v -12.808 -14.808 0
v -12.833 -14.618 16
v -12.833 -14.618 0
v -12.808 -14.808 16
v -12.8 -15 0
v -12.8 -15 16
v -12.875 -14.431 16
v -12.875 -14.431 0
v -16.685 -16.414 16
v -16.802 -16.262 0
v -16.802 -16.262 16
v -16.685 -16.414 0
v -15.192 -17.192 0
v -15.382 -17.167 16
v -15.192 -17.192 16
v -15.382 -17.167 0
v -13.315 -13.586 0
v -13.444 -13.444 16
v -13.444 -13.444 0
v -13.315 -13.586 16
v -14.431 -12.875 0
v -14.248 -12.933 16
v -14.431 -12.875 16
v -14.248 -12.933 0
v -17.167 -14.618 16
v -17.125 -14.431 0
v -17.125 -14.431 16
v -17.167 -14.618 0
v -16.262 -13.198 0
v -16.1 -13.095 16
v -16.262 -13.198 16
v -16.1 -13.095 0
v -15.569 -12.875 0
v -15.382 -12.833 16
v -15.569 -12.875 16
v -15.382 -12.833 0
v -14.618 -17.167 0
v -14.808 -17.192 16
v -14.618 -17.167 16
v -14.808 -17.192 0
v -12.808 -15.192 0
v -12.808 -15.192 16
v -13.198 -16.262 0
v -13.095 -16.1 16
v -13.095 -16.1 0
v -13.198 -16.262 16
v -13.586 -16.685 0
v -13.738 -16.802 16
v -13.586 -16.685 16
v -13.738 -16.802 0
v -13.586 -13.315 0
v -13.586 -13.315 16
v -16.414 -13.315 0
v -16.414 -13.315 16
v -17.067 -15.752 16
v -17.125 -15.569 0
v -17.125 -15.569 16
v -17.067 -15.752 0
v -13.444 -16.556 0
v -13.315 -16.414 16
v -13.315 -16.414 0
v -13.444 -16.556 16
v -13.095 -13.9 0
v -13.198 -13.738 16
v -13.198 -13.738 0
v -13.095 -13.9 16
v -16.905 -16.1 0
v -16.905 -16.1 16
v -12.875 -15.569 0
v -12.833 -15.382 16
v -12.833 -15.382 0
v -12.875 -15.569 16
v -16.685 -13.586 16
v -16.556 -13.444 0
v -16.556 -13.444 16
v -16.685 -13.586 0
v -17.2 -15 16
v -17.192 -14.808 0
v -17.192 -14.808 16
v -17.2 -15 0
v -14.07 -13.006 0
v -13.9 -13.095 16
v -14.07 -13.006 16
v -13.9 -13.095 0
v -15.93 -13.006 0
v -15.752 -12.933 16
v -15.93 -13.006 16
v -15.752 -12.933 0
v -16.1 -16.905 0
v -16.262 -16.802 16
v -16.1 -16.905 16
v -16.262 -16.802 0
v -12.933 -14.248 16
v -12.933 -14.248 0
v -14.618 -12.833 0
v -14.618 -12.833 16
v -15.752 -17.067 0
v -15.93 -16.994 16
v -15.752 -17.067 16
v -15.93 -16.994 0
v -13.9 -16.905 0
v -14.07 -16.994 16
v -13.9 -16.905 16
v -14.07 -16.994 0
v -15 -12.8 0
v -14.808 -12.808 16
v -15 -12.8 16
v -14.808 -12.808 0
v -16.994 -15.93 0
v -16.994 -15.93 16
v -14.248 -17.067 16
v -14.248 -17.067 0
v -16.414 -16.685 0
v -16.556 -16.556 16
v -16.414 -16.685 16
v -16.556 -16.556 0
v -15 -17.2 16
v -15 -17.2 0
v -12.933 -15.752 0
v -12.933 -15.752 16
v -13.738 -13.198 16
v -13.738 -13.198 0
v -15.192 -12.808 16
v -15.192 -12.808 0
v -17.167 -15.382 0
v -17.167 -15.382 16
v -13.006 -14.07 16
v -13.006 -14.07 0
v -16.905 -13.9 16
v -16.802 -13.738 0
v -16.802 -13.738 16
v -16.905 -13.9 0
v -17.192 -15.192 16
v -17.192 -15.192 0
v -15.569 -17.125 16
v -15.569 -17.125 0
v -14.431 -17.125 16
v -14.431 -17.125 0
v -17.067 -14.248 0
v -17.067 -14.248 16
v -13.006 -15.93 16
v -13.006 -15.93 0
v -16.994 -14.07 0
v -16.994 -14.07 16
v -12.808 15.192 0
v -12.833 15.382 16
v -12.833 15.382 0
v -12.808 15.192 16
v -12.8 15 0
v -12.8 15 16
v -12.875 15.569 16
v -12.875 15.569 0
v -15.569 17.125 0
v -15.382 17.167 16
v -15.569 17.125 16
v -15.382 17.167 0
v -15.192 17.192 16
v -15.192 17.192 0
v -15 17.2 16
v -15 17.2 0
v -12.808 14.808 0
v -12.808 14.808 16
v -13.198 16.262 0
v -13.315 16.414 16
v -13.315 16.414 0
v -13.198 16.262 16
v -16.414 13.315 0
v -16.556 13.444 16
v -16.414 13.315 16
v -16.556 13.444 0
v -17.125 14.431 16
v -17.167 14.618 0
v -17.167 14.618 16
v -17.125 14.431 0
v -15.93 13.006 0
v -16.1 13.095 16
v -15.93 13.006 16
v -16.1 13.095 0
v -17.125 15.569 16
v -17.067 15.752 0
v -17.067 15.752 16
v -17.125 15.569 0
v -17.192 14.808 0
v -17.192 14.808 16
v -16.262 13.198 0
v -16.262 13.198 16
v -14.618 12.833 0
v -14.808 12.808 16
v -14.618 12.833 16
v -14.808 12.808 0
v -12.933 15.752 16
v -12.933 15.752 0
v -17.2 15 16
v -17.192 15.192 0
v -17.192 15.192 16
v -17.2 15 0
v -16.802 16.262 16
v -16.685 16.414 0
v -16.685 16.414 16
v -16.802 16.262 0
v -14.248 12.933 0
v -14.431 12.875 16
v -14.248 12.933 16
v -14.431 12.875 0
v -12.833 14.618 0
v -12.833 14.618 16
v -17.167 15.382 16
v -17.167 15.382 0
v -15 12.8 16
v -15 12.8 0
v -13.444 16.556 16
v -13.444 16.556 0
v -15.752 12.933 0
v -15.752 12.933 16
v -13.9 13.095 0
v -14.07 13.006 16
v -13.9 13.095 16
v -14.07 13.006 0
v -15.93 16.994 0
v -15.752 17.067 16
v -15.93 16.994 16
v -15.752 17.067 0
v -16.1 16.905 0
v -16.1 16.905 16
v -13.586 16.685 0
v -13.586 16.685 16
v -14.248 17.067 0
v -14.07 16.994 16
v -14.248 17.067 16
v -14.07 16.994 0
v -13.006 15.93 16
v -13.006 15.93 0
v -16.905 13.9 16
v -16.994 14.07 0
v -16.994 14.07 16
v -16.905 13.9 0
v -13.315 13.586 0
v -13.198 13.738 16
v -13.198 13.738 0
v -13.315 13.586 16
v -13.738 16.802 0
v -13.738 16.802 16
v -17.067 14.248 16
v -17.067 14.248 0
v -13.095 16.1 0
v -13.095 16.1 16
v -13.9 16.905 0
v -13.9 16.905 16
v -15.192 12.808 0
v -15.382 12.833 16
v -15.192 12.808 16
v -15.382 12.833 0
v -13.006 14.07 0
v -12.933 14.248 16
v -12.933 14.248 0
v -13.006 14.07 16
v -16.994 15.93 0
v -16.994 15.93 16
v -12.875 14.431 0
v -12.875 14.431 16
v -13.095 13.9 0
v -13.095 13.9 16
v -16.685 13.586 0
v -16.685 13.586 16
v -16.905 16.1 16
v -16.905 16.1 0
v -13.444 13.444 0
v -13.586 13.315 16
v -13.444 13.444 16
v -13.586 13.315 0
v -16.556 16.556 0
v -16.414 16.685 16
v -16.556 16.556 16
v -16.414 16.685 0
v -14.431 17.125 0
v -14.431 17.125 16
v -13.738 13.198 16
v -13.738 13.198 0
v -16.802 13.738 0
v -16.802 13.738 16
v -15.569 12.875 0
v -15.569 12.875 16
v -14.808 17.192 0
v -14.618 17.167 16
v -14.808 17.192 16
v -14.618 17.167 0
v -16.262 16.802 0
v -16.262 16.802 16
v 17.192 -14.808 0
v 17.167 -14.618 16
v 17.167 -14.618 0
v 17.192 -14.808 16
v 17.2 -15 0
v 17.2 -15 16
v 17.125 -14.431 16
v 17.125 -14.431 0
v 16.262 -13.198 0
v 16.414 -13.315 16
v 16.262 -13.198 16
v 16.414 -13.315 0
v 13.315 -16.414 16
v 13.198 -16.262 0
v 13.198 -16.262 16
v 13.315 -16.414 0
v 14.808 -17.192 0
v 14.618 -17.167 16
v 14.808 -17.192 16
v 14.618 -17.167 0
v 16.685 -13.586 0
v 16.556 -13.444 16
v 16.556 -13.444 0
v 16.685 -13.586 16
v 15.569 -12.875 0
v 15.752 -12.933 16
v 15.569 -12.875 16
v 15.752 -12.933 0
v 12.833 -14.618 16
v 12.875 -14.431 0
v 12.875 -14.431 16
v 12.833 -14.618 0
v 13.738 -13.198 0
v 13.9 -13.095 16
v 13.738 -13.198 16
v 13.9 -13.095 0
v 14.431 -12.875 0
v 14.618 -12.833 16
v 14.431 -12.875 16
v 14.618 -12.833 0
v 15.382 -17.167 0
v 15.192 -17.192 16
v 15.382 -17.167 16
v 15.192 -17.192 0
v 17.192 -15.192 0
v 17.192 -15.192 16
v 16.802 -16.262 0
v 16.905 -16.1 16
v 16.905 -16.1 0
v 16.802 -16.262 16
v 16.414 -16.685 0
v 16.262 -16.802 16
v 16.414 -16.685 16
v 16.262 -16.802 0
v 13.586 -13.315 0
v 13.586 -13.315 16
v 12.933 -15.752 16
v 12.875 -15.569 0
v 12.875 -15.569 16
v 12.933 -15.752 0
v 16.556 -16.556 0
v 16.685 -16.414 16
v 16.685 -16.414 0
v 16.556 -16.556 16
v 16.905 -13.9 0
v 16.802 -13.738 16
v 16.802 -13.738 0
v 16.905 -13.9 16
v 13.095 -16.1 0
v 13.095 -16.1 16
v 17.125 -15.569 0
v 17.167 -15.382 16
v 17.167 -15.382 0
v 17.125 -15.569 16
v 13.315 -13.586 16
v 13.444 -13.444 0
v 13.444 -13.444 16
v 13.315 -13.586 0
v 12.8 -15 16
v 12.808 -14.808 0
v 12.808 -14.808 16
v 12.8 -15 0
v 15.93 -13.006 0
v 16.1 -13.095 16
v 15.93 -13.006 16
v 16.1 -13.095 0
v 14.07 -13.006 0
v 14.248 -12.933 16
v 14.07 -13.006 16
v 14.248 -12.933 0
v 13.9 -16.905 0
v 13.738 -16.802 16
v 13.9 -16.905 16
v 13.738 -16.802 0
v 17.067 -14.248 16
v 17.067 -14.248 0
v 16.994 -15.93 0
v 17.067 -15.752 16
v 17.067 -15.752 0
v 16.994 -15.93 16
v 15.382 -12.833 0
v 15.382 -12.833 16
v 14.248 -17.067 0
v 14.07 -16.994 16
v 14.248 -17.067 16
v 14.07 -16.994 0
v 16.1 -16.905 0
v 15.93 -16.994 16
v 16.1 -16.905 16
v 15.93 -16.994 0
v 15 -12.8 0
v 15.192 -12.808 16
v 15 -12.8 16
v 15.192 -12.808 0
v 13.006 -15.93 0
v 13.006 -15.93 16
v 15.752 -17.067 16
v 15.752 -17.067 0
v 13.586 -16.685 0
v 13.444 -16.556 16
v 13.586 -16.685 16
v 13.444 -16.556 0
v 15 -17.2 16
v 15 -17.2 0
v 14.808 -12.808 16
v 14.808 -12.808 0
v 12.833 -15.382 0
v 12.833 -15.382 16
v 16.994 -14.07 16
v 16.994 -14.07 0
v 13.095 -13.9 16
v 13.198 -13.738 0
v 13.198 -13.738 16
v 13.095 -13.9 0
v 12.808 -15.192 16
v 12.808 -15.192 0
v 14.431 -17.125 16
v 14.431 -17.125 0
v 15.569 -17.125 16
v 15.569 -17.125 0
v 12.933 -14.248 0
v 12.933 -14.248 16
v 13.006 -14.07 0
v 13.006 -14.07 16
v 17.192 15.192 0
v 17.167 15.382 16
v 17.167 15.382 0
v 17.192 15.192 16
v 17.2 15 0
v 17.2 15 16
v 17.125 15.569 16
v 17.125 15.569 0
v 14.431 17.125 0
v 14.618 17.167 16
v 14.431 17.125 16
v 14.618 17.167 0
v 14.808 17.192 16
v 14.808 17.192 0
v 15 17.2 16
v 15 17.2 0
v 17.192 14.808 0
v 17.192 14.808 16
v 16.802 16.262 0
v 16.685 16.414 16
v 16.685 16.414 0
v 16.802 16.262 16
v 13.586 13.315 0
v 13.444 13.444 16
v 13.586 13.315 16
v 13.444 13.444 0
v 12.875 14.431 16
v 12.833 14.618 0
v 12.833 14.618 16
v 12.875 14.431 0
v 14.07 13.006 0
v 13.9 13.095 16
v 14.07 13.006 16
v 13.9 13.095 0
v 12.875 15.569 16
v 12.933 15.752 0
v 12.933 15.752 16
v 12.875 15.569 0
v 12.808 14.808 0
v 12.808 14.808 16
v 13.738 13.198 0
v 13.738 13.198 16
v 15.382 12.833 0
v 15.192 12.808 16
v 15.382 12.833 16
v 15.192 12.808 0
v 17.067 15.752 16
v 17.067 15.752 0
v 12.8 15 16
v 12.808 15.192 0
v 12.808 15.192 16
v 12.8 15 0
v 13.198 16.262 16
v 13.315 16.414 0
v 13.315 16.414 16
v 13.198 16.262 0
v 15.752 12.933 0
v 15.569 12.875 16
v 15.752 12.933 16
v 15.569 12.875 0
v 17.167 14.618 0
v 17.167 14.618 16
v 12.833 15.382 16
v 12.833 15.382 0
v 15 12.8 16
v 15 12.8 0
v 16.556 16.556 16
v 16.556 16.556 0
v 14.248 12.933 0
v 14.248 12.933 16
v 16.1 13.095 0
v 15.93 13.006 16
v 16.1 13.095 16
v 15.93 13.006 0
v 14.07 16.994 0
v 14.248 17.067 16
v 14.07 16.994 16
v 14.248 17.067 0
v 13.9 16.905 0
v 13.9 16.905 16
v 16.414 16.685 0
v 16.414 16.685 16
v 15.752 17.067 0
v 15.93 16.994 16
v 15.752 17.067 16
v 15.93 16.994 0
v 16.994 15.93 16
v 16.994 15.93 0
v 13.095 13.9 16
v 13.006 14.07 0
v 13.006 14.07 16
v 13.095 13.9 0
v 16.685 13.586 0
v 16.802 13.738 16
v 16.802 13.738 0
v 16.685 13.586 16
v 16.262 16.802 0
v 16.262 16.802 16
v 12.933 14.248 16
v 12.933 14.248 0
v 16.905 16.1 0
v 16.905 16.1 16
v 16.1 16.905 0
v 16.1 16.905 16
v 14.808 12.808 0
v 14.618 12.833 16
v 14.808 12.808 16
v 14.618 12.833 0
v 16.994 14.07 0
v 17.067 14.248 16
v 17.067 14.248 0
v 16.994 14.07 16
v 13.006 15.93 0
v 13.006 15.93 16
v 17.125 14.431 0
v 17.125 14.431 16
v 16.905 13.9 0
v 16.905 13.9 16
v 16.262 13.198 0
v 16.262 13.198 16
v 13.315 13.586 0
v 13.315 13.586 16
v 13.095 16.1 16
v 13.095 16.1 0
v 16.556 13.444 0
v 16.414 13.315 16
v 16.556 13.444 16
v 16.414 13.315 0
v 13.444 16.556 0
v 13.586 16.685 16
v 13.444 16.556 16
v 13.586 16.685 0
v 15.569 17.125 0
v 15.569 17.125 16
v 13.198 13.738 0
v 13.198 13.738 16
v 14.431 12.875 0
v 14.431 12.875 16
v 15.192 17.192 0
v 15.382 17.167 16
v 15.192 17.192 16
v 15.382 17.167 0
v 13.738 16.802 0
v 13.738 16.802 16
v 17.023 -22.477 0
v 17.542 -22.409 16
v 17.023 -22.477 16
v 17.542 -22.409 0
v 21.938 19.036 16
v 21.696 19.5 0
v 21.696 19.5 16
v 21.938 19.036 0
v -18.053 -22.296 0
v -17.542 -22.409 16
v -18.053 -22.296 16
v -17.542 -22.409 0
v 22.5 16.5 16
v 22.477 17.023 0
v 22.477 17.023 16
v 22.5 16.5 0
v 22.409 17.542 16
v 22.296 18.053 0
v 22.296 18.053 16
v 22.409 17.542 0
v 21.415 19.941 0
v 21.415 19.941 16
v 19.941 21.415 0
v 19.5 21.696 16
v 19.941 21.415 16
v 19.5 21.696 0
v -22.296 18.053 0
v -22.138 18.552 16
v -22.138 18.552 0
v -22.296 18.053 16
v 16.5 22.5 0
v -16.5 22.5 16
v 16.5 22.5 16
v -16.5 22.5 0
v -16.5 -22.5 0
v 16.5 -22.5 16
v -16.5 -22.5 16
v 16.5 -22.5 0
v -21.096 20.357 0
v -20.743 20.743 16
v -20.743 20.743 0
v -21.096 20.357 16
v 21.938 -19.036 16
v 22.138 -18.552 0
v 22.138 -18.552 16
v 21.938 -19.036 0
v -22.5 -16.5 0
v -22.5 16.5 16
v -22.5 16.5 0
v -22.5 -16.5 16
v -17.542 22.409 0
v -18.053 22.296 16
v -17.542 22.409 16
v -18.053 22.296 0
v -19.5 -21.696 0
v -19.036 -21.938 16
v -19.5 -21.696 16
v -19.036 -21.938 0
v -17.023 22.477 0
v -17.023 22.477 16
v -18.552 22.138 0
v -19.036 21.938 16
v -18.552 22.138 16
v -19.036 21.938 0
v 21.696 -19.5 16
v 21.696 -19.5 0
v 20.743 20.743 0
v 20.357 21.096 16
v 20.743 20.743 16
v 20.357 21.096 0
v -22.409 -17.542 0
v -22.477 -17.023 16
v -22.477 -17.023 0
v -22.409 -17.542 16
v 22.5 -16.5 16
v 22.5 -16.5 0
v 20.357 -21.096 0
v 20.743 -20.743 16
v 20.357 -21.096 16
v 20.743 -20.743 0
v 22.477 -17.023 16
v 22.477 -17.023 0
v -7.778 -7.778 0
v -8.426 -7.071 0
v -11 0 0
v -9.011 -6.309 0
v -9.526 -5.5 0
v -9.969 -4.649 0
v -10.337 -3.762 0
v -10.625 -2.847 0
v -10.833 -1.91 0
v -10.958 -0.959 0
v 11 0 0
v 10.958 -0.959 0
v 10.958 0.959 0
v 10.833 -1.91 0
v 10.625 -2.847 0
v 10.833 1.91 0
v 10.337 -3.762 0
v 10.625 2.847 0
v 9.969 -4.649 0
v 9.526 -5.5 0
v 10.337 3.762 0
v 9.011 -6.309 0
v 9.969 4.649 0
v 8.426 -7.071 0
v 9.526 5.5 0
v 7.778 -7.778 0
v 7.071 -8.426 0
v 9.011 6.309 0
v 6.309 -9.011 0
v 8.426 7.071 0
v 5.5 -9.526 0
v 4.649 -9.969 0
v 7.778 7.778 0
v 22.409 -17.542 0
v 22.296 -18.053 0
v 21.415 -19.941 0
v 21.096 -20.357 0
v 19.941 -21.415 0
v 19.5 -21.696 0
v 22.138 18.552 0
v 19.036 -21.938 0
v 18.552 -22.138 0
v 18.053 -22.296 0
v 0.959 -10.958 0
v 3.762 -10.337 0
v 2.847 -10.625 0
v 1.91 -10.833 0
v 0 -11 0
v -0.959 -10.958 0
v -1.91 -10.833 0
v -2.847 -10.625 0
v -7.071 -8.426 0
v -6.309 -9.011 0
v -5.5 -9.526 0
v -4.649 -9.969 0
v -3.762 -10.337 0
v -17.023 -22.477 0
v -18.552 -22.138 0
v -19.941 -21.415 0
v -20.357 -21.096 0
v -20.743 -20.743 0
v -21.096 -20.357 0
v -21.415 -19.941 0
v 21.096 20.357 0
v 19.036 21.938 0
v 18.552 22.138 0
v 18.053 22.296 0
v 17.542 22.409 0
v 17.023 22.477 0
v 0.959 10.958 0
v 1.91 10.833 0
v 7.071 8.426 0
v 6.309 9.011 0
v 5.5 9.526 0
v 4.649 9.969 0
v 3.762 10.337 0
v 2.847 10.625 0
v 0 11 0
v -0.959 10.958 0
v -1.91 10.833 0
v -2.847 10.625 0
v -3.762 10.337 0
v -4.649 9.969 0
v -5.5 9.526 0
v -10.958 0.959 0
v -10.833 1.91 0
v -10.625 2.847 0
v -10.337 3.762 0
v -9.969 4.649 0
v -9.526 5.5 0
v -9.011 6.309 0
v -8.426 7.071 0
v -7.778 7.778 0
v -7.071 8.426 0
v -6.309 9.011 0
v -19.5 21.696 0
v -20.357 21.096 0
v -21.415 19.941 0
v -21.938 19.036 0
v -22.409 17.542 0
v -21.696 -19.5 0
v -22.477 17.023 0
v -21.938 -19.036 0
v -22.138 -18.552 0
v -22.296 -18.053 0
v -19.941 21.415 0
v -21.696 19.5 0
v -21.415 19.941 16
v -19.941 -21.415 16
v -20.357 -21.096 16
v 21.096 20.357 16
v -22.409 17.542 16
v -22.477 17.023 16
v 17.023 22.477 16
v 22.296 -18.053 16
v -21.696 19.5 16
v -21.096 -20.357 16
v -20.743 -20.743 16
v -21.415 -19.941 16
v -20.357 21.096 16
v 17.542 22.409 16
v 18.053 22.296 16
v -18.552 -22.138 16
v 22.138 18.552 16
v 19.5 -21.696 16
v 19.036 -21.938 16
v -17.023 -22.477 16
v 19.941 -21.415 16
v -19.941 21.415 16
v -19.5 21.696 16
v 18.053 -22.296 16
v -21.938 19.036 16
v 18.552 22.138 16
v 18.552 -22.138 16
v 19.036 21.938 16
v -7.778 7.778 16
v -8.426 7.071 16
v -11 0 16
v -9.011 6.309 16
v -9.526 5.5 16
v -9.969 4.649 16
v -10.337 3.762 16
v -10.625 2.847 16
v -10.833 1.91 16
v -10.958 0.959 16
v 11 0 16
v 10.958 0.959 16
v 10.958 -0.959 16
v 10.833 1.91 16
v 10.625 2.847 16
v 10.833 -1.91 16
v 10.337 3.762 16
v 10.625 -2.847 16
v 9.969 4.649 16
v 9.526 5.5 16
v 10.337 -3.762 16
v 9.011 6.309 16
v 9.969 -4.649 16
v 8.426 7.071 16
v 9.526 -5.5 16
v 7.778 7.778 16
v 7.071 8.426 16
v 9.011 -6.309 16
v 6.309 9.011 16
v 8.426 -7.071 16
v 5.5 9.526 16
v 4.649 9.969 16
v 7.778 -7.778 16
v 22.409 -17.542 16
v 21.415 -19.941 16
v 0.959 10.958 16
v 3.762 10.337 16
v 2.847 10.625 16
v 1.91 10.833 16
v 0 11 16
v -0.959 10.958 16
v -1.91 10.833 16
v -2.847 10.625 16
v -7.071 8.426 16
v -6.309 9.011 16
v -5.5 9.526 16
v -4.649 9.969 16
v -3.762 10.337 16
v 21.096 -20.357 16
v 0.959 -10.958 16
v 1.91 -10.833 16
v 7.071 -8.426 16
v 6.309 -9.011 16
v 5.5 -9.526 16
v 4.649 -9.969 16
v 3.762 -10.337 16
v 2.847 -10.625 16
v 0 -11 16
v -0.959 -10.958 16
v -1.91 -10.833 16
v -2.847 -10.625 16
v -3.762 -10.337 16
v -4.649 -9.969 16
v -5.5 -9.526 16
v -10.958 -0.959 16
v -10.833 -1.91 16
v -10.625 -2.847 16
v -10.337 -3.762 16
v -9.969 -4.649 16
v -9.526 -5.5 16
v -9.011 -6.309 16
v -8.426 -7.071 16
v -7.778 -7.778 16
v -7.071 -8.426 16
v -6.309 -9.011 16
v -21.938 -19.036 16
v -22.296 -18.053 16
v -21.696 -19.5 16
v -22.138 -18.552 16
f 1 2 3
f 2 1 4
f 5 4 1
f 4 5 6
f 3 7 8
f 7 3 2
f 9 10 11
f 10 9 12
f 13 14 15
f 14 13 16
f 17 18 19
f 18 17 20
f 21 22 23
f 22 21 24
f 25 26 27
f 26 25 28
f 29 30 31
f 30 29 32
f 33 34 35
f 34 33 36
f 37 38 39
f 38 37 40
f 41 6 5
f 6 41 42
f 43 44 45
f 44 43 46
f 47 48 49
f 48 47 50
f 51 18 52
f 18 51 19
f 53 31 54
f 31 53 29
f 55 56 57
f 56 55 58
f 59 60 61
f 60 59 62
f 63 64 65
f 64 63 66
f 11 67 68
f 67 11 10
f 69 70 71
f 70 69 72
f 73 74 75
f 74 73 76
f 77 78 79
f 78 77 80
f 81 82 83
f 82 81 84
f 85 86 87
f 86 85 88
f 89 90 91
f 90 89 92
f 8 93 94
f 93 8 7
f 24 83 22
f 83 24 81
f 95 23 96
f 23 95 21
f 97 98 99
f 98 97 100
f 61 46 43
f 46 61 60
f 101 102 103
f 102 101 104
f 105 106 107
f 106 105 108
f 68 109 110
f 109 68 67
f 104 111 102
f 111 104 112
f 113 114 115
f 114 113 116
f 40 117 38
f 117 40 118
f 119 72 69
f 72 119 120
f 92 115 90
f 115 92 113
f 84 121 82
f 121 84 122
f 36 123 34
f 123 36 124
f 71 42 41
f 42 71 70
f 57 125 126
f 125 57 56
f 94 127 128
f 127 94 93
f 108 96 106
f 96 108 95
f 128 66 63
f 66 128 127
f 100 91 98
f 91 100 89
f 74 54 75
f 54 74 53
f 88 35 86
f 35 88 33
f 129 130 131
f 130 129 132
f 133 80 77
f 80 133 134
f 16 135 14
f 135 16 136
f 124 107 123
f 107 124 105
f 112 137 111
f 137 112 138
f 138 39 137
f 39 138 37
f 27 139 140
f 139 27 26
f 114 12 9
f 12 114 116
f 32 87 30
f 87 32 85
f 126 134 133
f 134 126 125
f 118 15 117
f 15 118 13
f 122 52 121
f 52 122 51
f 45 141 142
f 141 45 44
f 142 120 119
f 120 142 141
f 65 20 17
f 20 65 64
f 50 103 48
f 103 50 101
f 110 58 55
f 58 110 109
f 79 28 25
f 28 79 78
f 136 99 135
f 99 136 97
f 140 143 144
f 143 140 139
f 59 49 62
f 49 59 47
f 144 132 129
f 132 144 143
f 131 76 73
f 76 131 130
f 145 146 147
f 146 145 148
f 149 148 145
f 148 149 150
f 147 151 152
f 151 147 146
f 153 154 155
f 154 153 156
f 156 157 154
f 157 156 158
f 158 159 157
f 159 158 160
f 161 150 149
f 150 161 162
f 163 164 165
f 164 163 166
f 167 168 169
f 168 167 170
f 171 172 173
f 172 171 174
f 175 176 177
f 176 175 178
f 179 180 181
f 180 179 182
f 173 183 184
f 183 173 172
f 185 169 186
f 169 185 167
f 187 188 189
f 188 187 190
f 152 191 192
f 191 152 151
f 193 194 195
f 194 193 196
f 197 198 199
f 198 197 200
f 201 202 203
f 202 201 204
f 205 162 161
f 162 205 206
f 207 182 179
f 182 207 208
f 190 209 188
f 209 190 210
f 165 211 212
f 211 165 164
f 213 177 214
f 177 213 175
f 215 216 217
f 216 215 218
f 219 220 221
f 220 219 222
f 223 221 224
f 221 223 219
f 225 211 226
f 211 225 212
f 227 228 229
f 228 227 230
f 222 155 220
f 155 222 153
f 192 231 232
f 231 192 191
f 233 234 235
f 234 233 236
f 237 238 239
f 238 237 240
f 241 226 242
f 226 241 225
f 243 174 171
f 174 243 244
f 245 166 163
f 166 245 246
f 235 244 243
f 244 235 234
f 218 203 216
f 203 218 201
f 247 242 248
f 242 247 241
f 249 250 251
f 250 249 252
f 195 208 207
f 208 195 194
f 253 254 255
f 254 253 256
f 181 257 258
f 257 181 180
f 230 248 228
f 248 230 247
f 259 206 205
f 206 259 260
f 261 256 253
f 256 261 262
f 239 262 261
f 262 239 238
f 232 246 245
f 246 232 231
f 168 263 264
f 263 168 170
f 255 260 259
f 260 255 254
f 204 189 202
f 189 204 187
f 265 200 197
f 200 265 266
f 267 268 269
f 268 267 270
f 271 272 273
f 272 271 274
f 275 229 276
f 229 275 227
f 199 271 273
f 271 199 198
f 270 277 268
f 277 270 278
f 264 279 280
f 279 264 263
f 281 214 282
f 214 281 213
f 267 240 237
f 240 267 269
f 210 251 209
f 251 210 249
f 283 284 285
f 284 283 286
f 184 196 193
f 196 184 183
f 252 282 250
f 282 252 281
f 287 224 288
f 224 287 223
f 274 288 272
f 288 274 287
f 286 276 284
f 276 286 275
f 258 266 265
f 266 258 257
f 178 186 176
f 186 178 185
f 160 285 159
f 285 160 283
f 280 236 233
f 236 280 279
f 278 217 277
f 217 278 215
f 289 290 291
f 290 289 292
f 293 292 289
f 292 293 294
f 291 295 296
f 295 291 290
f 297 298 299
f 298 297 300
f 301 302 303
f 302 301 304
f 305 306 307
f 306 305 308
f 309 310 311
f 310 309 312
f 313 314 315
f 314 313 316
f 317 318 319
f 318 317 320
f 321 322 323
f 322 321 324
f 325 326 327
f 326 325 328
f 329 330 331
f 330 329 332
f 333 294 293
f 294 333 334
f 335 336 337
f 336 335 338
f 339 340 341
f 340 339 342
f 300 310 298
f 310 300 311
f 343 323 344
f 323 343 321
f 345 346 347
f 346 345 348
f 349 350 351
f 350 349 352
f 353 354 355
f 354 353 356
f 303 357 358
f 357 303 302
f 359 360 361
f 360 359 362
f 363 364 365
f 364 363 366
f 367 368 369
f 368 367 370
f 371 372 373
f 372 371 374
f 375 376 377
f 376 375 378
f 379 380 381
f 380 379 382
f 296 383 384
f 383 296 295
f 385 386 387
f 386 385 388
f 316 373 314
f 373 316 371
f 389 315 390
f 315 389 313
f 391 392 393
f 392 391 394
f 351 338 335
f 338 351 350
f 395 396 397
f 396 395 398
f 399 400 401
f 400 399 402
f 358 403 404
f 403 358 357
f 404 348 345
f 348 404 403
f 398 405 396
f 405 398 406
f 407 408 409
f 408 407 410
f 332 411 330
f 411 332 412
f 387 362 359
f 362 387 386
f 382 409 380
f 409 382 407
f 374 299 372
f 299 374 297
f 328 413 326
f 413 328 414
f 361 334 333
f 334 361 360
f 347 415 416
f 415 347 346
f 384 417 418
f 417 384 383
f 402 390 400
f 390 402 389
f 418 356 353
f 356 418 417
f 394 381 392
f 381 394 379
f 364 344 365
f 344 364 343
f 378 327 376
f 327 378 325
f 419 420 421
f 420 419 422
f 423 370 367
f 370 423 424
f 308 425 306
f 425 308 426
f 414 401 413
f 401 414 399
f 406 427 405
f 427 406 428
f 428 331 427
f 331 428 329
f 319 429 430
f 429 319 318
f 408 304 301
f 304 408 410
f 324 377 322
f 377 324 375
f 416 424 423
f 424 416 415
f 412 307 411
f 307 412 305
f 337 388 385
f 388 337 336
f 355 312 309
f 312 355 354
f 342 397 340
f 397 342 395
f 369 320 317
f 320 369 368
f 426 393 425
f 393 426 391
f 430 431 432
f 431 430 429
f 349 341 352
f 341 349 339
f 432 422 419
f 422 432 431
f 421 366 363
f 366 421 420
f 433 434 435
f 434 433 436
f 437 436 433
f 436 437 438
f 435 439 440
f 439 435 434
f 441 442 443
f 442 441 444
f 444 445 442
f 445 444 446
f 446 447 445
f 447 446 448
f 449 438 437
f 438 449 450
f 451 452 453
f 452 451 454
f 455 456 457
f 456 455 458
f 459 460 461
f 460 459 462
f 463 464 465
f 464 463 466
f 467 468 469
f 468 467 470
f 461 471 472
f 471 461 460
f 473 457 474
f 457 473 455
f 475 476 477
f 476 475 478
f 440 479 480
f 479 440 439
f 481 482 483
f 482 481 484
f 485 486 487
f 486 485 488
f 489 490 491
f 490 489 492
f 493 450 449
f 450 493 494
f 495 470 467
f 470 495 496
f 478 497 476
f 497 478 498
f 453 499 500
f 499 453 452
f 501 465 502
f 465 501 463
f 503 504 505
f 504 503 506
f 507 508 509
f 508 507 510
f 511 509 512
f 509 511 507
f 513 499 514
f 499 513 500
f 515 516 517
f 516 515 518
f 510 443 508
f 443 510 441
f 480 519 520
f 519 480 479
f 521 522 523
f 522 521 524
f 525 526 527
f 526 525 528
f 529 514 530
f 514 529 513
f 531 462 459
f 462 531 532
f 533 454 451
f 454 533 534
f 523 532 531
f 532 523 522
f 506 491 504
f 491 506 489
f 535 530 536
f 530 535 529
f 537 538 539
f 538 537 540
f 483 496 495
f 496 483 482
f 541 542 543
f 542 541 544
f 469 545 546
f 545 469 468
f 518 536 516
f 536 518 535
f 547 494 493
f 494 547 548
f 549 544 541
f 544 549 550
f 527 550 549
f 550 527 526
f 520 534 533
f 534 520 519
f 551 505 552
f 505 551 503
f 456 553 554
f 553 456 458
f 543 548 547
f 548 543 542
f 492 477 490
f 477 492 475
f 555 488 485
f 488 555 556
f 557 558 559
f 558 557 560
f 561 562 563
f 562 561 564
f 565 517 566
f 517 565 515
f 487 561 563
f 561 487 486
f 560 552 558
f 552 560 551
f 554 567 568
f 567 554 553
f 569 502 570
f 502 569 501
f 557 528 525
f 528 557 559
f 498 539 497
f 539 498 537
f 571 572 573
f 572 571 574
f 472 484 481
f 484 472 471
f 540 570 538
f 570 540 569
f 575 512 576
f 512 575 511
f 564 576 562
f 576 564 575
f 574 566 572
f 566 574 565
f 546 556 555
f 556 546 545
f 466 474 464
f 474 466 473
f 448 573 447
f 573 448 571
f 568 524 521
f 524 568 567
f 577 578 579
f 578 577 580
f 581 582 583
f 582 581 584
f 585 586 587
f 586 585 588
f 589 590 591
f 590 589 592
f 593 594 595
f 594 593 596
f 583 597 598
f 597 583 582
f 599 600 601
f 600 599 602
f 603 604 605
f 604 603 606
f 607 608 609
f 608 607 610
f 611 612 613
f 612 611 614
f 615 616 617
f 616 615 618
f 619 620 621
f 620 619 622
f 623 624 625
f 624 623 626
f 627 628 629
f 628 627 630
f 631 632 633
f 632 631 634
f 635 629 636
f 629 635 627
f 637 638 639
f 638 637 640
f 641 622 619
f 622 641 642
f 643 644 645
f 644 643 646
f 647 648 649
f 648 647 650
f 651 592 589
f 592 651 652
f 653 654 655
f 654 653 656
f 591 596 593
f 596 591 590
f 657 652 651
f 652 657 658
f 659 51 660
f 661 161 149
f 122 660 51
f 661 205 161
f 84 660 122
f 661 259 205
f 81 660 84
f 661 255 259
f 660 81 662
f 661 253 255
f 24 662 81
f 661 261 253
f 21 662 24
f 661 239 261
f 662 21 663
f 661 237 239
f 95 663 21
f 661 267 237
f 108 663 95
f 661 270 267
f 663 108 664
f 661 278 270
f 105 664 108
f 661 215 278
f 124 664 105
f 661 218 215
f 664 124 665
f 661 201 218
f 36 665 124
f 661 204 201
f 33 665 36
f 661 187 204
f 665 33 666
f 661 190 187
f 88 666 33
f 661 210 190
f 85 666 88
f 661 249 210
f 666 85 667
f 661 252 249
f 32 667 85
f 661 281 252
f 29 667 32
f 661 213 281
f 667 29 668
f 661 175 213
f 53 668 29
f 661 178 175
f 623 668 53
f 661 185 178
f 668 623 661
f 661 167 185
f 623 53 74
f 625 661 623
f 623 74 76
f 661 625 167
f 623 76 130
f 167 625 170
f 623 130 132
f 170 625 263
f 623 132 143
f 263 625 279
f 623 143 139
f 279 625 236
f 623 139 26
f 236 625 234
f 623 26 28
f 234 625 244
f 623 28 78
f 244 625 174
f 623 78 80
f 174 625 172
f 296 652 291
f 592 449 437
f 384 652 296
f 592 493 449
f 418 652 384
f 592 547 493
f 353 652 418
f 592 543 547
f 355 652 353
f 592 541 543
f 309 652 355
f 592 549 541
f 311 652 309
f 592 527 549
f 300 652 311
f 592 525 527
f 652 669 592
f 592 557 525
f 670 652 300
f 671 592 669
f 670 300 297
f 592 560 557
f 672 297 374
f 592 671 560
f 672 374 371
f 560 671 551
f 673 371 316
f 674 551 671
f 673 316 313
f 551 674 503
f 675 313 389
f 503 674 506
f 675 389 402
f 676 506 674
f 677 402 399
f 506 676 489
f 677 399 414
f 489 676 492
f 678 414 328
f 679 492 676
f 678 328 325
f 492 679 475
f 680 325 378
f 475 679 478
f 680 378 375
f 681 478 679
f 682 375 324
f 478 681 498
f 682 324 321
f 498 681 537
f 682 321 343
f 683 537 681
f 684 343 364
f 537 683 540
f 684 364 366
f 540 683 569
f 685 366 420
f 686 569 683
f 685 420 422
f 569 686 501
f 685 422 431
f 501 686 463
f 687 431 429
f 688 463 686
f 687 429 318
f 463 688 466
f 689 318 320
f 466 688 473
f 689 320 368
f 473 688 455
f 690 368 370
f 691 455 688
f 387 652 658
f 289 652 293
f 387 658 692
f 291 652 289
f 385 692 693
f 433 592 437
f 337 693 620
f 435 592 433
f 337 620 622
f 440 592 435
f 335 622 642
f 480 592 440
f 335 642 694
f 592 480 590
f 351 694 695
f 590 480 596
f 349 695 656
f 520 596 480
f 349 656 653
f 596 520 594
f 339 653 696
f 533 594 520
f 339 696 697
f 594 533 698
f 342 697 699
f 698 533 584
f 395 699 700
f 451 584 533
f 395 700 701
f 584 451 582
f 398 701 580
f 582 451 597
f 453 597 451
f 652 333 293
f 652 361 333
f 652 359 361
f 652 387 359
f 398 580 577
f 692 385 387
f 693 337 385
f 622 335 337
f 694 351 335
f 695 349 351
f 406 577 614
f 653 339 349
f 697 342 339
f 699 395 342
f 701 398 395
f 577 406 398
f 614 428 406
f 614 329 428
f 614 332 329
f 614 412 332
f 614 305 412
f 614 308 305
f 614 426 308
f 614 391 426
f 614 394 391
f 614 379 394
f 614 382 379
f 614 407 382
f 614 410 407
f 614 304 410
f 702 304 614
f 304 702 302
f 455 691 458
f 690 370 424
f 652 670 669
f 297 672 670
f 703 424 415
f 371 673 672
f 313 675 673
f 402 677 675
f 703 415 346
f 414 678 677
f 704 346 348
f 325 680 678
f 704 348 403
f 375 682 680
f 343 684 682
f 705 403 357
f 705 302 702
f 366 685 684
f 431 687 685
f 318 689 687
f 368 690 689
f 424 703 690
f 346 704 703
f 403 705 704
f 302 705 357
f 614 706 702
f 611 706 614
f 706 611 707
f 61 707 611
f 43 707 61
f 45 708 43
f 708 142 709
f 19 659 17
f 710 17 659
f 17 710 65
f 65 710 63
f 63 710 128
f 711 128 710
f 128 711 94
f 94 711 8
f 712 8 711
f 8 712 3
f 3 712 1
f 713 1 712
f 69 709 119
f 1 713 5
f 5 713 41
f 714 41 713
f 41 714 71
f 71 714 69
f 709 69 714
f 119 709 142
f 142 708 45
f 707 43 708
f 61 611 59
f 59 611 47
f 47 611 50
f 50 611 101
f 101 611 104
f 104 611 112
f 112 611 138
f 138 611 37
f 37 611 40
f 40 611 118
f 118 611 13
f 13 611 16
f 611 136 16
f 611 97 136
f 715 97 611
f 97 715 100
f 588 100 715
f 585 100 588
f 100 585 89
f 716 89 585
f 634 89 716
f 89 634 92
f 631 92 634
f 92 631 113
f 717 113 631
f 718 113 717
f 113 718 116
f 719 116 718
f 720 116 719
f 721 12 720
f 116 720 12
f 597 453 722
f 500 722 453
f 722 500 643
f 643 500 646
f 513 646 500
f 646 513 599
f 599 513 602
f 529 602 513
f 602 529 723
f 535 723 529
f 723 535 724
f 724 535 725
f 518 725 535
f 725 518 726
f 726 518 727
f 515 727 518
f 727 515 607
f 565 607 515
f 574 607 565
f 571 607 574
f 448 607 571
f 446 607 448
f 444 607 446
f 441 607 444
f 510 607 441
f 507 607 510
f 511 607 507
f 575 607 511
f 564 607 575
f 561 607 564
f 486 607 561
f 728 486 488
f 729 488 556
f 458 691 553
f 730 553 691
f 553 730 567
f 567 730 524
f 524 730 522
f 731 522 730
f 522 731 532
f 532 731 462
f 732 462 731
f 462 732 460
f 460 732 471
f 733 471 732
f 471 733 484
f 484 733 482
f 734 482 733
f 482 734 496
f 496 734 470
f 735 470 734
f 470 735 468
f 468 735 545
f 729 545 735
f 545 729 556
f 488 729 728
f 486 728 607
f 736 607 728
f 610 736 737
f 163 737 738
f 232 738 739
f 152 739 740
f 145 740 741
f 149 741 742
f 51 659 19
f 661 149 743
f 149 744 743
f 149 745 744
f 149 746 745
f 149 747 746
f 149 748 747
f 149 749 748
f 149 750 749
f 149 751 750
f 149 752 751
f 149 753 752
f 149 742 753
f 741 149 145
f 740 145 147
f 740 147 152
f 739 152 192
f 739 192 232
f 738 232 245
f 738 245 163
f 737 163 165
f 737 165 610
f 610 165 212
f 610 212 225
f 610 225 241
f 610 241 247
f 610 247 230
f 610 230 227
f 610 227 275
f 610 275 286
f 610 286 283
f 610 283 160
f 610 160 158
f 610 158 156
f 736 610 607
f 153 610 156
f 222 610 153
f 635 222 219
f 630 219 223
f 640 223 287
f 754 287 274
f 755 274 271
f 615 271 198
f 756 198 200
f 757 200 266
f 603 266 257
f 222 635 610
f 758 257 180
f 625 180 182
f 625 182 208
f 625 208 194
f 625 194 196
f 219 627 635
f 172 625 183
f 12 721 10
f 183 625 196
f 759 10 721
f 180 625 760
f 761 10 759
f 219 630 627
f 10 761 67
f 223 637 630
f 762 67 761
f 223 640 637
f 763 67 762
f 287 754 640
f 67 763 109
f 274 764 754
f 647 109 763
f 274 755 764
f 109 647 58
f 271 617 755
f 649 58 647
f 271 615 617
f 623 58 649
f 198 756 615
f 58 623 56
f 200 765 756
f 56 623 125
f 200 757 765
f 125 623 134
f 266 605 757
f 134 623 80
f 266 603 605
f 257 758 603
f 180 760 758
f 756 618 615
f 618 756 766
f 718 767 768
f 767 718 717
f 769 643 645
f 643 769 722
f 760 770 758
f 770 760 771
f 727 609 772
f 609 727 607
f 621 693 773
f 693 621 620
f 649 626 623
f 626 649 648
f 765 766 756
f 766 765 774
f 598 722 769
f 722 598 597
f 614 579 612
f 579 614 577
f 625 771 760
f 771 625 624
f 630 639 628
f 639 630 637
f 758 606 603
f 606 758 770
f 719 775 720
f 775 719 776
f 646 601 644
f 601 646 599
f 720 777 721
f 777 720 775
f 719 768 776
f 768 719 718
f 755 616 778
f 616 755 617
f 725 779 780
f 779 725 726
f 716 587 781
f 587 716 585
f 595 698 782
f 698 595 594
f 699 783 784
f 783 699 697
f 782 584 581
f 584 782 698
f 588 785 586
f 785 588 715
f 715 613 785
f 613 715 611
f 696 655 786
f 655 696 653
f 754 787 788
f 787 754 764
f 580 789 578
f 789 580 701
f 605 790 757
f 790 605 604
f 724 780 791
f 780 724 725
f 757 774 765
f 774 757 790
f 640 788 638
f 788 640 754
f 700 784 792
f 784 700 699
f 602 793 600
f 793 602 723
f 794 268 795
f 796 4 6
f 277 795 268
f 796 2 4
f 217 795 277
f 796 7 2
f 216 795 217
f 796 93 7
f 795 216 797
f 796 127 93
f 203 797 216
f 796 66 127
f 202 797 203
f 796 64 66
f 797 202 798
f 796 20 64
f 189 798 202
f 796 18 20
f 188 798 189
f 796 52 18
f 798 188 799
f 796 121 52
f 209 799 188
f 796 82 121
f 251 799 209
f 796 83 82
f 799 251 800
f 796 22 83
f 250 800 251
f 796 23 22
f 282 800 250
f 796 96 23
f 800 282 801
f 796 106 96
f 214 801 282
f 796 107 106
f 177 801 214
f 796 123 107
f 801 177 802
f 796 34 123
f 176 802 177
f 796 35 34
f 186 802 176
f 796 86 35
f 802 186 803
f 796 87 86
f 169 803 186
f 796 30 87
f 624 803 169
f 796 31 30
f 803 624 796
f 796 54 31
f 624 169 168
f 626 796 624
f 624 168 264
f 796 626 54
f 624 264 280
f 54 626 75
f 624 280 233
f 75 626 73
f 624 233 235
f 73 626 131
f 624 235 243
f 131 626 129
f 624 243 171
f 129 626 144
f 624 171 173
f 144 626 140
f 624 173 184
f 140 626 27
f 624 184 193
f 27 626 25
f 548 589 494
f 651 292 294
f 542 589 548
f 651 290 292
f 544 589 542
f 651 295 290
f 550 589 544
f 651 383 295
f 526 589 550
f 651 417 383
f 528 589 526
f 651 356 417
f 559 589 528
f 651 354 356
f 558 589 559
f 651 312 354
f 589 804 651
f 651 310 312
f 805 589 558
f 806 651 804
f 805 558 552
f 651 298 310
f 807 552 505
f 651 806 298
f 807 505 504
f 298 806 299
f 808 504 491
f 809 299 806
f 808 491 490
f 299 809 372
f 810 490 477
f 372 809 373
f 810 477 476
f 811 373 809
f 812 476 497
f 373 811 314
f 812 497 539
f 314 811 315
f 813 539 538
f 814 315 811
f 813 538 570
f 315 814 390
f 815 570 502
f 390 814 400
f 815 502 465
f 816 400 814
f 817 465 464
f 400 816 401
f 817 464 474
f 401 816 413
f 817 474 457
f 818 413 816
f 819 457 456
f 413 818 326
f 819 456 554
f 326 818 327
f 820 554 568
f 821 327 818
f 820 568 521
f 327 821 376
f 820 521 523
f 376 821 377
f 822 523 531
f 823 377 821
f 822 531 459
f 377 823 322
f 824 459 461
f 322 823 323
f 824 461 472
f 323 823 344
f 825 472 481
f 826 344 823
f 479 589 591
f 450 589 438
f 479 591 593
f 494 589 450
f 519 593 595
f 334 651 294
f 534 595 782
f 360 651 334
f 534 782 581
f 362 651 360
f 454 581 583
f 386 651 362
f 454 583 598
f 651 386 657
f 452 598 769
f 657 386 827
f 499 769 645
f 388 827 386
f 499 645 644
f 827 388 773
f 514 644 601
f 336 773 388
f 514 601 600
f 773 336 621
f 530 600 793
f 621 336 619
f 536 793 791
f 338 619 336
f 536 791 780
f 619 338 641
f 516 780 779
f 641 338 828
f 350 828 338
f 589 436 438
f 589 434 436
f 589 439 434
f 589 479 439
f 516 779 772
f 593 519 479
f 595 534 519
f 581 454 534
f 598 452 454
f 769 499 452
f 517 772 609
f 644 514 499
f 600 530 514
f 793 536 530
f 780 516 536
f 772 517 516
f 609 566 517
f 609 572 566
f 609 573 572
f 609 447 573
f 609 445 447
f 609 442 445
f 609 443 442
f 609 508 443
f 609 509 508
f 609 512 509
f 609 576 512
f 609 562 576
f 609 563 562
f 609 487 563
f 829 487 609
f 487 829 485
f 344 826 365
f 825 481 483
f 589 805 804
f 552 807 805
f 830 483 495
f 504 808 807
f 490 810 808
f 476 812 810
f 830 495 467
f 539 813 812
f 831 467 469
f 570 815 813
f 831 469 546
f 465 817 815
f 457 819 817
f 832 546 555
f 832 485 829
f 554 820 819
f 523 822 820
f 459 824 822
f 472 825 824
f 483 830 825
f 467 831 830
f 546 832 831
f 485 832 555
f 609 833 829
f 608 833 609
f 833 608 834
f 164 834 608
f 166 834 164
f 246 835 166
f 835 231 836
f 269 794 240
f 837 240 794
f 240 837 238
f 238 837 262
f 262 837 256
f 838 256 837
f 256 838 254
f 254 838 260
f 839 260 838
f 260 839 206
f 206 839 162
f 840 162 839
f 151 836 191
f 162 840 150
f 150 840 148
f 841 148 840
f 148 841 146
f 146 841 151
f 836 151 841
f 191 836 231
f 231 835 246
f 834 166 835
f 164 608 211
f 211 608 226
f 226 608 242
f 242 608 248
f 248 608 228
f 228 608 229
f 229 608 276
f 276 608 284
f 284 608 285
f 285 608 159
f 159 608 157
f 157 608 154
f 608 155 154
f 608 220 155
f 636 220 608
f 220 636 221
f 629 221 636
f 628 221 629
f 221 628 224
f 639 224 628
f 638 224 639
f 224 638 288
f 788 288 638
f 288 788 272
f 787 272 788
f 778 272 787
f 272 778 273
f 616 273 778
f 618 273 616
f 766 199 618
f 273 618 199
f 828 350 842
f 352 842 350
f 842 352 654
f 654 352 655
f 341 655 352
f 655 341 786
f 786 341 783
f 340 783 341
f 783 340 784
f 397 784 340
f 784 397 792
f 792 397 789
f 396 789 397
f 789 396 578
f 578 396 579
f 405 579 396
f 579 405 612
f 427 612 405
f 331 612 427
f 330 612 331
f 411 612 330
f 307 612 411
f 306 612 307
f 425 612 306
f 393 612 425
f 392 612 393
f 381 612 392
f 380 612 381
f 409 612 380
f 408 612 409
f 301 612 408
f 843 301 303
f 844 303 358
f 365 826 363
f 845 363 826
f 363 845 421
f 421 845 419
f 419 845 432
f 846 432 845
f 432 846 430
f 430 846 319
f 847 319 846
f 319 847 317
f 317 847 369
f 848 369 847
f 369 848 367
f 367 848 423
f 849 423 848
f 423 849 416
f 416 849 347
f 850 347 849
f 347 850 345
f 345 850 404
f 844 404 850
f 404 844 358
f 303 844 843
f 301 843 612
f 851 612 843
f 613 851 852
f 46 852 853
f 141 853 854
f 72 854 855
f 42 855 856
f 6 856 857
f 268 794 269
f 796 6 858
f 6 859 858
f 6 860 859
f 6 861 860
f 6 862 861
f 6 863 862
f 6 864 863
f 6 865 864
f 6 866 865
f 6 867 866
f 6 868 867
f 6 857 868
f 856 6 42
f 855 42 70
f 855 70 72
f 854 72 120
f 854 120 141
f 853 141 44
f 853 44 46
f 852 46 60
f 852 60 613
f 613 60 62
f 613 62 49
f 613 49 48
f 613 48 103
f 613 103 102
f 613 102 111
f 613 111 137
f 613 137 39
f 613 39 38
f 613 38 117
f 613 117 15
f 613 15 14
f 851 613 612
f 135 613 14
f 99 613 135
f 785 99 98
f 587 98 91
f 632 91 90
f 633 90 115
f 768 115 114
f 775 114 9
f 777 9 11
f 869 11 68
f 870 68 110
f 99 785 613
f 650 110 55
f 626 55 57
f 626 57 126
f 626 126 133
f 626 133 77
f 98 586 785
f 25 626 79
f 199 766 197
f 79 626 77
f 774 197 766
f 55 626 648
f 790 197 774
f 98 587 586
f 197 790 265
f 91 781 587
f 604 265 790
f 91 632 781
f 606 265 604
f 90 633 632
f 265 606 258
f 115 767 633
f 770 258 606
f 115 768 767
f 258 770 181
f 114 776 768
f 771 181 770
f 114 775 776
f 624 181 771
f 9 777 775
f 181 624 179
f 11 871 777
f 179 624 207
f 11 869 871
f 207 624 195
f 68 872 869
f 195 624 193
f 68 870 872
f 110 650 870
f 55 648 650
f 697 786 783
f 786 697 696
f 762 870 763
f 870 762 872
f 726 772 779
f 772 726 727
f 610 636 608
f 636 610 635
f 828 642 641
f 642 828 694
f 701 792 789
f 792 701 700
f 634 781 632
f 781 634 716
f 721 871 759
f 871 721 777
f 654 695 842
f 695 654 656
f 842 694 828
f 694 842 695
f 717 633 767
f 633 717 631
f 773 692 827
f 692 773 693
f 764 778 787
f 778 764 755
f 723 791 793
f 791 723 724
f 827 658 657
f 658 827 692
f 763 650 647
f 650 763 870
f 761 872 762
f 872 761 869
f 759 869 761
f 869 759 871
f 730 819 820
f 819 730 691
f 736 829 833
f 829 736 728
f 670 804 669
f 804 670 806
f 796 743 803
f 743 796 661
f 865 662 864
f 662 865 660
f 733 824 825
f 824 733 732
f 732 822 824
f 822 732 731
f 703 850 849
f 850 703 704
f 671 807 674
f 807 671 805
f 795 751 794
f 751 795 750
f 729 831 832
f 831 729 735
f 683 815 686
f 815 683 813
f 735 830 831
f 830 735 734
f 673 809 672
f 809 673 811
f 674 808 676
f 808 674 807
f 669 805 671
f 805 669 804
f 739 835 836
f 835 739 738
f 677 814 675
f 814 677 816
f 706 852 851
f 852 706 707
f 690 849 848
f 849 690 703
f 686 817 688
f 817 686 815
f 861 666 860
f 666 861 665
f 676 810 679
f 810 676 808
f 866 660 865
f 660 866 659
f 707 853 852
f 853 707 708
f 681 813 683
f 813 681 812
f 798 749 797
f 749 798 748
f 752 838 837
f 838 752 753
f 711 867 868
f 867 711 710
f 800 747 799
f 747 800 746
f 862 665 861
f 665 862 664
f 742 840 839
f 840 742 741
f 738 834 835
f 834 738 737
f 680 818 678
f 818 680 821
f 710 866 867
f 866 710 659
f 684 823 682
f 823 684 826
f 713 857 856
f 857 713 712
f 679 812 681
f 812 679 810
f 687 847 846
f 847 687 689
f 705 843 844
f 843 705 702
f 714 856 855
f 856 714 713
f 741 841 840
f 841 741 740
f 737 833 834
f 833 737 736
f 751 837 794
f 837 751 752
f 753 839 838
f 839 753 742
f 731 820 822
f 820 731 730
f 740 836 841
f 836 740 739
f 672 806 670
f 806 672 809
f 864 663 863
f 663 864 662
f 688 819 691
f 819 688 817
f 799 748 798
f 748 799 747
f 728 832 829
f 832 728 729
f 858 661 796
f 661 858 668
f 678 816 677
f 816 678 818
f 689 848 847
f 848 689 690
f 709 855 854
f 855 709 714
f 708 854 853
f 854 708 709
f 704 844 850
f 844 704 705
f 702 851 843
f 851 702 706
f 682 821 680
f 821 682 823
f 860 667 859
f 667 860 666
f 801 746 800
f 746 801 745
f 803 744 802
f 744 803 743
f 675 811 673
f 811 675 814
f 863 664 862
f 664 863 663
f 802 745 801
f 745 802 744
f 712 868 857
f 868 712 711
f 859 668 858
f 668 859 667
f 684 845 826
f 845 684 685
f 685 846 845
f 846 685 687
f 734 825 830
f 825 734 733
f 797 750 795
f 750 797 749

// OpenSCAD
use <../rugged_rover_complete.scad>;
wheel_bearing_block();
